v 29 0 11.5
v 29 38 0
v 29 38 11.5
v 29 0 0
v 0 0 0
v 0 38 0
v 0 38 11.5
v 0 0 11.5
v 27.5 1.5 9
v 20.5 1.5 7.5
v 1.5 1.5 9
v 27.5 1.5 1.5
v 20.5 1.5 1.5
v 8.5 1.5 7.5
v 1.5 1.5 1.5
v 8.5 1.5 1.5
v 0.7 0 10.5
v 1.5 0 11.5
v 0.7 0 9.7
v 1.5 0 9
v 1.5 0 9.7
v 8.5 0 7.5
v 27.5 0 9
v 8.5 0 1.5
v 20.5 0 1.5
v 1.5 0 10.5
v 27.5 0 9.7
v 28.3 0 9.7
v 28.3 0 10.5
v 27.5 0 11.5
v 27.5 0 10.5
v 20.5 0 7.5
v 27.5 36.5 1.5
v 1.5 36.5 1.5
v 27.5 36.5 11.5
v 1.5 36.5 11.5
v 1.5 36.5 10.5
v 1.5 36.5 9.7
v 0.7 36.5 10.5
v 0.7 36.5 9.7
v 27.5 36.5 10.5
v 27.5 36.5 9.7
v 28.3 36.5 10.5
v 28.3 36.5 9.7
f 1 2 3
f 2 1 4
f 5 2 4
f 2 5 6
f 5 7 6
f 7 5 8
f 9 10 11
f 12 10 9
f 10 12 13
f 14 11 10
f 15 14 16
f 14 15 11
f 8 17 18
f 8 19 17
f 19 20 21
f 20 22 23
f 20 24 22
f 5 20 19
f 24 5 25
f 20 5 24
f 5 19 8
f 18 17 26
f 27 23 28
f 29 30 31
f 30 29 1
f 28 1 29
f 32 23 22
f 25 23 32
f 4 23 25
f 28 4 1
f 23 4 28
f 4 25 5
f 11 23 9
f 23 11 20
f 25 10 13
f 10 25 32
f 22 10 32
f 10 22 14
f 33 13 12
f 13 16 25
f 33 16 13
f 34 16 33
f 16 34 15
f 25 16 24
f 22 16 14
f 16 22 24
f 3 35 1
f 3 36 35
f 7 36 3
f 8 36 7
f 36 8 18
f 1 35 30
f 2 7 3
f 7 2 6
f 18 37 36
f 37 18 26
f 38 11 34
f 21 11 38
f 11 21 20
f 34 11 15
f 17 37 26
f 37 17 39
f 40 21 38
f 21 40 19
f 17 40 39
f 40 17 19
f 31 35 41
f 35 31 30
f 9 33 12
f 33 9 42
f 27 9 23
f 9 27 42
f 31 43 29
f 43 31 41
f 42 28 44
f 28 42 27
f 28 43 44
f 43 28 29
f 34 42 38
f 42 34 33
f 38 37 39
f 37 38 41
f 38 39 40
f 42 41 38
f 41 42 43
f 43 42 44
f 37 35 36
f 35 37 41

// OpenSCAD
l=35;
w=26;
h=10;
t=1.5;

slot=0.80;
trim=2.5;

module cutout(x,z,len,height)
{
    translate([x+t,-t,z+t]){
        cube([len,3*t,height]);
    }
}

// Bottom
cube([w+2*t,l+2*t,t]);


// Front
translate([0,0,0]){
    rotate([0,0,0]){ 
        difference(){
           cube([w+2*t,t,h+t]);
            
           translate([0,-t,h+t-trim]){
               cube([w*2*t,3*t,trim]);
           }
           //cutout(3,15,20,3);
           cutout(7,0,12,6);
        }
    }
}

// Back
translate([w+2*t,l+2*t,0]){
    rotate([0,0,180]){
        difference(){
           cube([w+2*t,t,h+t]);
            
            //cutout(1.5,15,23,3);
        }
    }
}

// Left
translate([0,l+2*t,0]){
    rotate([0,0,-90]){ 
        difference() {
           cube([l+2*t,t,h+t]);
           translate([0,t-slot,h+t-slot-1]){
               cube([l+2*t,slot+.2,slot]);
           }
            //cutout(7.5,15,20,3);
        }
    }
}

// Right
translate([w+2*t,0,0]){
    rotate([0,0,90]){
        difference(){ 
           cube([l+2*t,t,h+t]);
            
            translate([0,t-slot,h+t-slot-1]){
               cube([l+2*t,slot+0.2,slot]);
           }
            //cutout(7.5,15,20,3);
            
        }
    }
}
